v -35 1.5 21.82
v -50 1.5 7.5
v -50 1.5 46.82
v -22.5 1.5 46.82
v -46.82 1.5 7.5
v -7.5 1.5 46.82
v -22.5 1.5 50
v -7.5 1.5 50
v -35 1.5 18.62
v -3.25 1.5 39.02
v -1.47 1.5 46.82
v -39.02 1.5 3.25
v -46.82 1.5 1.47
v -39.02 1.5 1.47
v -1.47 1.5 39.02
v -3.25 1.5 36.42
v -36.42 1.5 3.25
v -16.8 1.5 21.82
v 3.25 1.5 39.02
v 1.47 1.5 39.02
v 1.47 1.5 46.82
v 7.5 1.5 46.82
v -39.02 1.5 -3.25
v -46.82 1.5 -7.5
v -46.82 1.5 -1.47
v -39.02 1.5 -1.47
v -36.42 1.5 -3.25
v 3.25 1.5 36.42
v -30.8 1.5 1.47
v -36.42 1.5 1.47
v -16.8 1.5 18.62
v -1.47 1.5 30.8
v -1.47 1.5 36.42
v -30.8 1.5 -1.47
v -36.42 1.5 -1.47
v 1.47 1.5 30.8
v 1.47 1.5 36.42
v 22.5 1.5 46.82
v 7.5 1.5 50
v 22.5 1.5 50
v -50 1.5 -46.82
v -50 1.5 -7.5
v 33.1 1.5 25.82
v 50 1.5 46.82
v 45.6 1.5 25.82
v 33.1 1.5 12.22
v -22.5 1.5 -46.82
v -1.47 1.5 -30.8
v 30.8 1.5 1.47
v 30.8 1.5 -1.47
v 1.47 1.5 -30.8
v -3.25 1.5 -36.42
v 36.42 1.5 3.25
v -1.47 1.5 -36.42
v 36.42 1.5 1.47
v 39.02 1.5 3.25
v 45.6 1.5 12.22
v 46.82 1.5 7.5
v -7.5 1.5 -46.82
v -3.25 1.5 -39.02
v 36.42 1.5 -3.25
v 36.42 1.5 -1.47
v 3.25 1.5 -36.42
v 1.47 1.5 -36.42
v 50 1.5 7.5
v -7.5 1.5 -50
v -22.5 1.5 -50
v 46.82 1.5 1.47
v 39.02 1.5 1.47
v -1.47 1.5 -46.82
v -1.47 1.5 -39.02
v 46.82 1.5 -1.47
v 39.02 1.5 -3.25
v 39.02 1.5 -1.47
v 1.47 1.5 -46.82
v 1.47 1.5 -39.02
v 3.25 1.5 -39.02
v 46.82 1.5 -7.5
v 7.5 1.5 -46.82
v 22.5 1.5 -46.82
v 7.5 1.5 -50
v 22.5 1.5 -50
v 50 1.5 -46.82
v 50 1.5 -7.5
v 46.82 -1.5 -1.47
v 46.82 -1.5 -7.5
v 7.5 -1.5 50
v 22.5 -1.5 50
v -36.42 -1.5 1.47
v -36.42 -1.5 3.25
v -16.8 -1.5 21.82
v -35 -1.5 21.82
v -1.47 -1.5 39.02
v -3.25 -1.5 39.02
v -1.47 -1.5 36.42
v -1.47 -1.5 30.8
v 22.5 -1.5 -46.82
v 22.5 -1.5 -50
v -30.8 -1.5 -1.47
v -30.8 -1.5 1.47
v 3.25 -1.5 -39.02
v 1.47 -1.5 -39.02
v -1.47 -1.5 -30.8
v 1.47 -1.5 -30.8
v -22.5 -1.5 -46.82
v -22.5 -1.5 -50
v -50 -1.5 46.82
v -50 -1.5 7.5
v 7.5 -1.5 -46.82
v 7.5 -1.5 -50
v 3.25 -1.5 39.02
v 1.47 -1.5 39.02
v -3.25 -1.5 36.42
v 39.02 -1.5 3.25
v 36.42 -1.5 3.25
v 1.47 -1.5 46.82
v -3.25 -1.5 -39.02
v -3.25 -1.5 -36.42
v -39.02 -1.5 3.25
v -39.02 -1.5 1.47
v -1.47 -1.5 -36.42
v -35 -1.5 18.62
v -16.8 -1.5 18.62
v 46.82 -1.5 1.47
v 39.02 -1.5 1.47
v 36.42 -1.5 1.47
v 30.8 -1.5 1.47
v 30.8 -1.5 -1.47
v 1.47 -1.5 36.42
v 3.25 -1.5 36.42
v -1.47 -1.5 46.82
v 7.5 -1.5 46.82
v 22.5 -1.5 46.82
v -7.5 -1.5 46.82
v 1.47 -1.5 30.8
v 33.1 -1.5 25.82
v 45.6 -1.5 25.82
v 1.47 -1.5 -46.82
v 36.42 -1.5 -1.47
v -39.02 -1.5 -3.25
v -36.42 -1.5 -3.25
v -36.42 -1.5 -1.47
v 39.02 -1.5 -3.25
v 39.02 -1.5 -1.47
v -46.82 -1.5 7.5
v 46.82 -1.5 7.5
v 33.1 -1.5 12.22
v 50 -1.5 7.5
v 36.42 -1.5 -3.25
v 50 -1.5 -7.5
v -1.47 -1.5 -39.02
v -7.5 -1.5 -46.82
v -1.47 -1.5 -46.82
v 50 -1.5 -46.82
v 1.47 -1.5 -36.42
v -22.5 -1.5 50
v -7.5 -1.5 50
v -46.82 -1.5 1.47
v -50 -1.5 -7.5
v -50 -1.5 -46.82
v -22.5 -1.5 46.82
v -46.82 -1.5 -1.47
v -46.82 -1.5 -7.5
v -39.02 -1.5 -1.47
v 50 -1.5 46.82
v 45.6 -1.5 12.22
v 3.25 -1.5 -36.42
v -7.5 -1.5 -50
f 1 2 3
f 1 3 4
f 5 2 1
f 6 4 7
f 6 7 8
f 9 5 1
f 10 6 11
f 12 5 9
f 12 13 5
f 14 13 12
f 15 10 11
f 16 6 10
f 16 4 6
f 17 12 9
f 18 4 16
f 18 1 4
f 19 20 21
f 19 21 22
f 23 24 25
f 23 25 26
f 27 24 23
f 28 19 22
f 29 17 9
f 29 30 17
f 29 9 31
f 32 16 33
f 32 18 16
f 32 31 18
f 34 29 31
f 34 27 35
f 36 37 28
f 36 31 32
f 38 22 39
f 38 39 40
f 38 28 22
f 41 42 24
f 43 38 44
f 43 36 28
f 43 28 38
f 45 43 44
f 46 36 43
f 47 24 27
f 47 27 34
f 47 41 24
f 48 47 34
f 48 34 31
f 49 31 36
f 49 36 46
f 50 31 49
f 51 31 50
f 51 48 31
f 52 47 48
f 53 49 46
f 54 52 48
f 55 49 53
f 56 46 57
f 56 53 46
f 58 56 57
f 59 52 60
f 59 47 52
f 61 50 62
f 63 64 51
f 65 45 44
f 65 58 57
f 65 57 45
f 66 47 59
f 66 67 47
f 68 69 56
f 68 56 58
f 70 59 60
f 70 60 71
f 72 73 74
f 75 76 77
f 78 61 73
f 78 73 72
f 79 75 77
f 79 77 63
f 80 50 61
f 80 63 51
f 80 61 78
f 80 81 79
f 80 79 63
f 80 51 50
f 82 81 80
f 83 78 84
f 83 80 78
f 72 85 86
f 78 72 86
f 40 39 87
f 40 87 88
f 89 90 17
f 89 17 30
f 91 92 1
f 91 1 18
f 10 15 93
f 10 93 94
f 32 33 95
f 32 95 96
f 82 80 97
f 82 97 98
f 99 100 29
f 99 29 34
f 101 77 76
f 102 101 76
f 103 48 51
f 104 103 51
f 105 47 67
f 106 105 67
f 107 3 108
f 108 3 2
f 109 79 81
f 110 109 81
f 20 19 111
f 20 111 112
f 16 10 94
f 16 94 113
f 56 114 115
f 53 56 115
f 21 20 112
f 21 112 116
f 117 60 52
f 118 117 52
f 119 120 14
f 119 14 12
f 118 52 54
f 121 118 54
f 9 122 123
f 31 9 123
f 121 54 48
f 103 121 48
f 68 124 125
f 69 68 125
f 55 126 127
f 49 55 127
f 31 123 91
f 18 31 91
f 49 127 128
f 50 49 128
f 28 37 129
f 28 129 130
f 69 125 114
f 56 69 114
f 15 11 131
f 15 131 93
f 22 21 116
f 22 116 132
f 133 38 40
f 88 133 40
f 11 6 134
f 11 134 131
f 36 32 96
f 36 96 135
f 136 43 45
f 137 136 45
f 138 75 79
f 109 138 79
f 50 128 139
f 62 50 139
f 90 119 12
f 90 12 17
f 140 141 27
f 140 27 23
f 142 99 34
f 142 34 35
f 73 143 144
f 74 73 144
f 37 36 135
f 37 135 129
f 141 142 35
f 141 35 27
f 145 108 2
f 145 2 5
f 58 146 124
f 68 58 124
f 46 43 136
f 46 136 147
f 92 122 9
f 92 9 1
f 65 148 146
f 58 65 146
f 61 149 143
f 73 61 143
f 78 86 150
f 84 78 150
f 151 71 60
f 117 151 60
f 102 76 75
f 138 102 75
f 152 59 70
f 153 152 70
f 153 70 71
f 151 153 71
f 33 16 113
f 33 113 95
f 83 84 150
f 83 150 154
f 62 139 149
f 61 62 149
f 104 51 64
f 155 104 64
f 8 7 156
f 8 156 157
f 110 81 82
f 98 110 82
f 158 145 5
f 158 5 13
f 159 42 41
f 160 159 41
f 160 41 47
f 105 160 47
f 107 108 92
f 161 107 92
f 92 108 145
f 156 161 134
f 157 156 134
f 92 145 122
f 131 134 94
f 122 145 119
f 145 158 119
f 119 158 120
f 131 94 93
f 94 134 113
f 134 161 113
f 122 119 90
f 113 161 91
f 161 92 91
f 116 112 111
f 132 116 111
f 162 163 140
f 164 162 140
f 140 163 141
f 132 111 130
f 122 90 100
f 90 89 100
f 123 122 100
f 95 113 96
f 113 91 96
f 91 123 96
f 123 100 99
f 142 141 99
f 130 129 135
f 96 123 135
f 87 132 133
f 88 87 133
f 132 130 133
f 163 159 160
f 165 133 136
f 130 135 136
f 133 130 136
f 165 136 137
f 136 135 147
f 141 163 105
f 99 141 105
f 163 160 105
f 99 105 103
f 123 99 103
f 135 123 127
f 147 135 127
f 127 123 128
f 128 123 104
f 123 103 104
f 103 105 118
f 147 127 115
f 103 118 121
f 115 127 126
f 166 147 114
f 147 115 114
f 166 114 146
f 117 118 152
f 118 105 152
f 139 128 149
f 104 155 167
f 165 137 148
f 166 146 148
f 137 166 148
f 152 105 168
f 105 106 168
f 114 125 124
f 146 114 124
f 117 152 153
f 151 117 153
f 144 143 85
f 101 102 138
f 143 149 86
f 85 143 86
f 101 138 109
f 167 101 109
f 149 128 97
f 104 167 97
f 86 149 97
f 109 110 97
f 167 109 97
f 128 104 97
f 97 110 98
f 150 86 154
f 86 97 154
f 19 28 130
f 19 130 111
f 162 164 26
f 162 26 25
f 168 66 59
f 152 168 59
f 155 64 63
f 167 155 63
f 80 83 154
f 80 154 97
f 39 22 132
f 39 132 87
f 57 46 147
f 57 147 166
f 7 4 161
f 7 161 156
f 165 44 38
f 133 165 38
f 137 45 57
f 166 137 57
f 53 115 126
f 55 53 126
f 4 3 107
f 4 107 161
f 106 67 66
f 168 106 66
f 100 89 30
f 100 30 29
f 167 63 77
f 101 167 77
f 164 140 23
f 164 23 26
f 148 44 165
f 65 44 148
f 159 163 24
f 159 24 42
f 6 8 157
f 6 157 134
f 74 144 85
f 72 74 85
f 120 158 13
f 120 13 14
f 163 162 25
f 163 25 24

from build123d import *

# Parameters (mm, degrees)
SKETCH1_W                = 100
SKETCH1_H                = 100
BOSS_EXTRUDE1_DEPTH      = 1.5
CUT_EXTRUDE6_DEPTH       = 71.774289117
SKETCH4_W                = 27.5
SKETCH4_H                = 3.18
CUT_EXTRUDE9_DEPTH       = 3
CUT_EXTRUDE10_DEPTH      = 3
MIRROR10_COPY_1_SKETCH_W = 27.5
MIRROR10_COPY_1_SKETCH_H = 3.18
MIRROR10_COPY_1_DEPTH    = 3
SKETCH27_W               = 18.2
SKETCH27_H               = 3.2
CUT_EXTRUDE19_DEPTH      = 3
SKETCH38_W               = 12.6
SKETCH38_H               = 13.5
BOSS_EXTRUDE5_DEPTH      = 3
SKETCH39_W               = 12.5
SKETCH39_H               = 13.6
CUT_EXTRUDE30_DEPTH      = 3


with BuildPart() as part:
    # Sketch1 → Boss-Extrude1 (new, symmetric)
    with BuildSketch(Plane(origin=(0, 0, 0), x_dir=(1, 0, 0), z_dir=(0, 1, 0))):
        Rectangle(SKETCH1_W, SKETCH1_H)
    extrude(amount=BOSS_EXTRUDE1_DEPTH, both=True)

    # Sketch2 → Cut-Extrude6 (cut, through all)
    with BuildSketch(Plane(origin=(0, 1.5, 0), x_dir=(1, 0, 0), z_dir=(0, 1, 0))):
        Polygon((-7.5, -50), (-7.5, -46.82), (-1.47, -46.82), (-1.47, -39.02), (-3.25, -39.02), (-3.25, -36.42), (-1.47, -36.42), (-1.47, -30.8), (1.47, -30.8), (1.47, -36.42), (3.25, -36.42), (3.25, -39.02), (1.47, -39.02), (1.47, -46.82), (7.5, -46.82), (7.5, -50), align=None)
    cut_extrude6 = extrude(amount=-CUT_EXTRUDE6_DEPTH, mode=Mode.SUBTRACT)

    # Mirror1: Cut-Extrude6 across plane
    add(cut_extrude6.mirror(Plane.XY), mode=Mode.SUBTRACT)

    # Sketch4 → Cut-Extrude9 (cut)
    with BuildSketch(Plane(origin=(0, 1.5, 0), x_dir=(1, 0, 0), z_dir=(0, 1, 0))):
        with Locations((-36.25, 48.41)):
            Rectangle(SKETCH4_W, SKETCH4_H)
    cut_extrude9 = extrude(amount=-CUT_EXTRUDE9_DEPTH, mode=Mode.SUBTRACT)

    # Sketch5 → Cut-Extrude10 (cut)
    with BuildSketch(Plane.XZ.offset(1.5)):
        Polygon((50, -7.5), (50, 7.5), (46.82, 7.5), (46.82, 1.47), (39.02, 1.47), (39.02, 3.25), (36.42, 3.25), (36.42, 1.47), (30.8, 1.47), (30.8, -1.47), (36.42, -1.47), (36.42, -3.25), (39.02, -3.25), (39.02, -1.47), (46.82, -1.47), (46.82, -7.5), align=None)
    cut_extrude10 = extrude(amount=-CUT_EXTRUDE10_DEPTH, mode=Mode.SUBTRACT)

    # Mirror6: Cut-Extrude10 across plane
    add(cut_extrude10.mirror(Plane(origin=(0, 0, 0), x_dir=(0, 0, 1), z_dir=(1, 0, 0))), mode=Mode.SUBTRACT)

    # Mirror9: Cut-Extrude9 across plane
    add(cut_extrude9.mirror(Plane.XY), mode=Mode.SUBTRACT)

    # Mirror10: Cut-Extrude9 across plane
    add(cut_extrude9.mirror(Plane(origin=(0, 0, 0), x_dir=(0, 0, 1), z_dir=(1, 0, 0))), mode=Mode.SUBTRACT)

    # Mirror10 copy 1 sketch → Mirror10 copy 1 (cut)
    with BuildSketch(Plane(origin=(0, 1.5, 0), x_dir=(-1, 0, 0), z_dir=(0, 1, 0))):
        with Locations((-36.25, 48.41)):
            Rectangle(MIRROR10_COPY_1_SKETCH_W, MIRROR10_COPY_1_SKETCH_H)
    extrude(amount=-MIRROR10_COPY_1_DEPTH, mode=Mode.SUBTRACT)

    # Sketch27 → Cut-Extrude19 (cut)
    with BuildSketch(Plane.XZ.offset(1.5)):
        with Locations((-25.9, 20.22)):
            Rectangle(SKETCH27_W, SKETCH27_H)
    extrude(amount=-CUT_EXTRUDE19_DEPTH, mode=Mode.SUBTRACT)

    # Sketch38 → Boss-Extrude5 (add)
    with BuildSketch(Plane(origin=(0, 1.5, 0), x_dir=(1, 0, 0), z_dir=(0, 1, 0))):
        with Locations((40.4, -19.07)):
            Rectangle(SKETCH38_W, SKETCH38_H)
    extrude(amount=-BOSS_EXTRUDE5_DEPTH)

    # Sketch39 → Cut-Extrude30 (cut)
    with BuildSketch(Plane(origin=(0, 1.5, 0), x_dir=(1, 0, 0), z_dir=(0, 1, 0))):
        with Locations((39.35, -19.02)):
            Rectangle(SKETCH39_W, SKETCH39_H)
    extrude(amount=-CUT_EXTRUDE30_DEPTH, mode=Mode.SUBTRACT)


solid = part.part
